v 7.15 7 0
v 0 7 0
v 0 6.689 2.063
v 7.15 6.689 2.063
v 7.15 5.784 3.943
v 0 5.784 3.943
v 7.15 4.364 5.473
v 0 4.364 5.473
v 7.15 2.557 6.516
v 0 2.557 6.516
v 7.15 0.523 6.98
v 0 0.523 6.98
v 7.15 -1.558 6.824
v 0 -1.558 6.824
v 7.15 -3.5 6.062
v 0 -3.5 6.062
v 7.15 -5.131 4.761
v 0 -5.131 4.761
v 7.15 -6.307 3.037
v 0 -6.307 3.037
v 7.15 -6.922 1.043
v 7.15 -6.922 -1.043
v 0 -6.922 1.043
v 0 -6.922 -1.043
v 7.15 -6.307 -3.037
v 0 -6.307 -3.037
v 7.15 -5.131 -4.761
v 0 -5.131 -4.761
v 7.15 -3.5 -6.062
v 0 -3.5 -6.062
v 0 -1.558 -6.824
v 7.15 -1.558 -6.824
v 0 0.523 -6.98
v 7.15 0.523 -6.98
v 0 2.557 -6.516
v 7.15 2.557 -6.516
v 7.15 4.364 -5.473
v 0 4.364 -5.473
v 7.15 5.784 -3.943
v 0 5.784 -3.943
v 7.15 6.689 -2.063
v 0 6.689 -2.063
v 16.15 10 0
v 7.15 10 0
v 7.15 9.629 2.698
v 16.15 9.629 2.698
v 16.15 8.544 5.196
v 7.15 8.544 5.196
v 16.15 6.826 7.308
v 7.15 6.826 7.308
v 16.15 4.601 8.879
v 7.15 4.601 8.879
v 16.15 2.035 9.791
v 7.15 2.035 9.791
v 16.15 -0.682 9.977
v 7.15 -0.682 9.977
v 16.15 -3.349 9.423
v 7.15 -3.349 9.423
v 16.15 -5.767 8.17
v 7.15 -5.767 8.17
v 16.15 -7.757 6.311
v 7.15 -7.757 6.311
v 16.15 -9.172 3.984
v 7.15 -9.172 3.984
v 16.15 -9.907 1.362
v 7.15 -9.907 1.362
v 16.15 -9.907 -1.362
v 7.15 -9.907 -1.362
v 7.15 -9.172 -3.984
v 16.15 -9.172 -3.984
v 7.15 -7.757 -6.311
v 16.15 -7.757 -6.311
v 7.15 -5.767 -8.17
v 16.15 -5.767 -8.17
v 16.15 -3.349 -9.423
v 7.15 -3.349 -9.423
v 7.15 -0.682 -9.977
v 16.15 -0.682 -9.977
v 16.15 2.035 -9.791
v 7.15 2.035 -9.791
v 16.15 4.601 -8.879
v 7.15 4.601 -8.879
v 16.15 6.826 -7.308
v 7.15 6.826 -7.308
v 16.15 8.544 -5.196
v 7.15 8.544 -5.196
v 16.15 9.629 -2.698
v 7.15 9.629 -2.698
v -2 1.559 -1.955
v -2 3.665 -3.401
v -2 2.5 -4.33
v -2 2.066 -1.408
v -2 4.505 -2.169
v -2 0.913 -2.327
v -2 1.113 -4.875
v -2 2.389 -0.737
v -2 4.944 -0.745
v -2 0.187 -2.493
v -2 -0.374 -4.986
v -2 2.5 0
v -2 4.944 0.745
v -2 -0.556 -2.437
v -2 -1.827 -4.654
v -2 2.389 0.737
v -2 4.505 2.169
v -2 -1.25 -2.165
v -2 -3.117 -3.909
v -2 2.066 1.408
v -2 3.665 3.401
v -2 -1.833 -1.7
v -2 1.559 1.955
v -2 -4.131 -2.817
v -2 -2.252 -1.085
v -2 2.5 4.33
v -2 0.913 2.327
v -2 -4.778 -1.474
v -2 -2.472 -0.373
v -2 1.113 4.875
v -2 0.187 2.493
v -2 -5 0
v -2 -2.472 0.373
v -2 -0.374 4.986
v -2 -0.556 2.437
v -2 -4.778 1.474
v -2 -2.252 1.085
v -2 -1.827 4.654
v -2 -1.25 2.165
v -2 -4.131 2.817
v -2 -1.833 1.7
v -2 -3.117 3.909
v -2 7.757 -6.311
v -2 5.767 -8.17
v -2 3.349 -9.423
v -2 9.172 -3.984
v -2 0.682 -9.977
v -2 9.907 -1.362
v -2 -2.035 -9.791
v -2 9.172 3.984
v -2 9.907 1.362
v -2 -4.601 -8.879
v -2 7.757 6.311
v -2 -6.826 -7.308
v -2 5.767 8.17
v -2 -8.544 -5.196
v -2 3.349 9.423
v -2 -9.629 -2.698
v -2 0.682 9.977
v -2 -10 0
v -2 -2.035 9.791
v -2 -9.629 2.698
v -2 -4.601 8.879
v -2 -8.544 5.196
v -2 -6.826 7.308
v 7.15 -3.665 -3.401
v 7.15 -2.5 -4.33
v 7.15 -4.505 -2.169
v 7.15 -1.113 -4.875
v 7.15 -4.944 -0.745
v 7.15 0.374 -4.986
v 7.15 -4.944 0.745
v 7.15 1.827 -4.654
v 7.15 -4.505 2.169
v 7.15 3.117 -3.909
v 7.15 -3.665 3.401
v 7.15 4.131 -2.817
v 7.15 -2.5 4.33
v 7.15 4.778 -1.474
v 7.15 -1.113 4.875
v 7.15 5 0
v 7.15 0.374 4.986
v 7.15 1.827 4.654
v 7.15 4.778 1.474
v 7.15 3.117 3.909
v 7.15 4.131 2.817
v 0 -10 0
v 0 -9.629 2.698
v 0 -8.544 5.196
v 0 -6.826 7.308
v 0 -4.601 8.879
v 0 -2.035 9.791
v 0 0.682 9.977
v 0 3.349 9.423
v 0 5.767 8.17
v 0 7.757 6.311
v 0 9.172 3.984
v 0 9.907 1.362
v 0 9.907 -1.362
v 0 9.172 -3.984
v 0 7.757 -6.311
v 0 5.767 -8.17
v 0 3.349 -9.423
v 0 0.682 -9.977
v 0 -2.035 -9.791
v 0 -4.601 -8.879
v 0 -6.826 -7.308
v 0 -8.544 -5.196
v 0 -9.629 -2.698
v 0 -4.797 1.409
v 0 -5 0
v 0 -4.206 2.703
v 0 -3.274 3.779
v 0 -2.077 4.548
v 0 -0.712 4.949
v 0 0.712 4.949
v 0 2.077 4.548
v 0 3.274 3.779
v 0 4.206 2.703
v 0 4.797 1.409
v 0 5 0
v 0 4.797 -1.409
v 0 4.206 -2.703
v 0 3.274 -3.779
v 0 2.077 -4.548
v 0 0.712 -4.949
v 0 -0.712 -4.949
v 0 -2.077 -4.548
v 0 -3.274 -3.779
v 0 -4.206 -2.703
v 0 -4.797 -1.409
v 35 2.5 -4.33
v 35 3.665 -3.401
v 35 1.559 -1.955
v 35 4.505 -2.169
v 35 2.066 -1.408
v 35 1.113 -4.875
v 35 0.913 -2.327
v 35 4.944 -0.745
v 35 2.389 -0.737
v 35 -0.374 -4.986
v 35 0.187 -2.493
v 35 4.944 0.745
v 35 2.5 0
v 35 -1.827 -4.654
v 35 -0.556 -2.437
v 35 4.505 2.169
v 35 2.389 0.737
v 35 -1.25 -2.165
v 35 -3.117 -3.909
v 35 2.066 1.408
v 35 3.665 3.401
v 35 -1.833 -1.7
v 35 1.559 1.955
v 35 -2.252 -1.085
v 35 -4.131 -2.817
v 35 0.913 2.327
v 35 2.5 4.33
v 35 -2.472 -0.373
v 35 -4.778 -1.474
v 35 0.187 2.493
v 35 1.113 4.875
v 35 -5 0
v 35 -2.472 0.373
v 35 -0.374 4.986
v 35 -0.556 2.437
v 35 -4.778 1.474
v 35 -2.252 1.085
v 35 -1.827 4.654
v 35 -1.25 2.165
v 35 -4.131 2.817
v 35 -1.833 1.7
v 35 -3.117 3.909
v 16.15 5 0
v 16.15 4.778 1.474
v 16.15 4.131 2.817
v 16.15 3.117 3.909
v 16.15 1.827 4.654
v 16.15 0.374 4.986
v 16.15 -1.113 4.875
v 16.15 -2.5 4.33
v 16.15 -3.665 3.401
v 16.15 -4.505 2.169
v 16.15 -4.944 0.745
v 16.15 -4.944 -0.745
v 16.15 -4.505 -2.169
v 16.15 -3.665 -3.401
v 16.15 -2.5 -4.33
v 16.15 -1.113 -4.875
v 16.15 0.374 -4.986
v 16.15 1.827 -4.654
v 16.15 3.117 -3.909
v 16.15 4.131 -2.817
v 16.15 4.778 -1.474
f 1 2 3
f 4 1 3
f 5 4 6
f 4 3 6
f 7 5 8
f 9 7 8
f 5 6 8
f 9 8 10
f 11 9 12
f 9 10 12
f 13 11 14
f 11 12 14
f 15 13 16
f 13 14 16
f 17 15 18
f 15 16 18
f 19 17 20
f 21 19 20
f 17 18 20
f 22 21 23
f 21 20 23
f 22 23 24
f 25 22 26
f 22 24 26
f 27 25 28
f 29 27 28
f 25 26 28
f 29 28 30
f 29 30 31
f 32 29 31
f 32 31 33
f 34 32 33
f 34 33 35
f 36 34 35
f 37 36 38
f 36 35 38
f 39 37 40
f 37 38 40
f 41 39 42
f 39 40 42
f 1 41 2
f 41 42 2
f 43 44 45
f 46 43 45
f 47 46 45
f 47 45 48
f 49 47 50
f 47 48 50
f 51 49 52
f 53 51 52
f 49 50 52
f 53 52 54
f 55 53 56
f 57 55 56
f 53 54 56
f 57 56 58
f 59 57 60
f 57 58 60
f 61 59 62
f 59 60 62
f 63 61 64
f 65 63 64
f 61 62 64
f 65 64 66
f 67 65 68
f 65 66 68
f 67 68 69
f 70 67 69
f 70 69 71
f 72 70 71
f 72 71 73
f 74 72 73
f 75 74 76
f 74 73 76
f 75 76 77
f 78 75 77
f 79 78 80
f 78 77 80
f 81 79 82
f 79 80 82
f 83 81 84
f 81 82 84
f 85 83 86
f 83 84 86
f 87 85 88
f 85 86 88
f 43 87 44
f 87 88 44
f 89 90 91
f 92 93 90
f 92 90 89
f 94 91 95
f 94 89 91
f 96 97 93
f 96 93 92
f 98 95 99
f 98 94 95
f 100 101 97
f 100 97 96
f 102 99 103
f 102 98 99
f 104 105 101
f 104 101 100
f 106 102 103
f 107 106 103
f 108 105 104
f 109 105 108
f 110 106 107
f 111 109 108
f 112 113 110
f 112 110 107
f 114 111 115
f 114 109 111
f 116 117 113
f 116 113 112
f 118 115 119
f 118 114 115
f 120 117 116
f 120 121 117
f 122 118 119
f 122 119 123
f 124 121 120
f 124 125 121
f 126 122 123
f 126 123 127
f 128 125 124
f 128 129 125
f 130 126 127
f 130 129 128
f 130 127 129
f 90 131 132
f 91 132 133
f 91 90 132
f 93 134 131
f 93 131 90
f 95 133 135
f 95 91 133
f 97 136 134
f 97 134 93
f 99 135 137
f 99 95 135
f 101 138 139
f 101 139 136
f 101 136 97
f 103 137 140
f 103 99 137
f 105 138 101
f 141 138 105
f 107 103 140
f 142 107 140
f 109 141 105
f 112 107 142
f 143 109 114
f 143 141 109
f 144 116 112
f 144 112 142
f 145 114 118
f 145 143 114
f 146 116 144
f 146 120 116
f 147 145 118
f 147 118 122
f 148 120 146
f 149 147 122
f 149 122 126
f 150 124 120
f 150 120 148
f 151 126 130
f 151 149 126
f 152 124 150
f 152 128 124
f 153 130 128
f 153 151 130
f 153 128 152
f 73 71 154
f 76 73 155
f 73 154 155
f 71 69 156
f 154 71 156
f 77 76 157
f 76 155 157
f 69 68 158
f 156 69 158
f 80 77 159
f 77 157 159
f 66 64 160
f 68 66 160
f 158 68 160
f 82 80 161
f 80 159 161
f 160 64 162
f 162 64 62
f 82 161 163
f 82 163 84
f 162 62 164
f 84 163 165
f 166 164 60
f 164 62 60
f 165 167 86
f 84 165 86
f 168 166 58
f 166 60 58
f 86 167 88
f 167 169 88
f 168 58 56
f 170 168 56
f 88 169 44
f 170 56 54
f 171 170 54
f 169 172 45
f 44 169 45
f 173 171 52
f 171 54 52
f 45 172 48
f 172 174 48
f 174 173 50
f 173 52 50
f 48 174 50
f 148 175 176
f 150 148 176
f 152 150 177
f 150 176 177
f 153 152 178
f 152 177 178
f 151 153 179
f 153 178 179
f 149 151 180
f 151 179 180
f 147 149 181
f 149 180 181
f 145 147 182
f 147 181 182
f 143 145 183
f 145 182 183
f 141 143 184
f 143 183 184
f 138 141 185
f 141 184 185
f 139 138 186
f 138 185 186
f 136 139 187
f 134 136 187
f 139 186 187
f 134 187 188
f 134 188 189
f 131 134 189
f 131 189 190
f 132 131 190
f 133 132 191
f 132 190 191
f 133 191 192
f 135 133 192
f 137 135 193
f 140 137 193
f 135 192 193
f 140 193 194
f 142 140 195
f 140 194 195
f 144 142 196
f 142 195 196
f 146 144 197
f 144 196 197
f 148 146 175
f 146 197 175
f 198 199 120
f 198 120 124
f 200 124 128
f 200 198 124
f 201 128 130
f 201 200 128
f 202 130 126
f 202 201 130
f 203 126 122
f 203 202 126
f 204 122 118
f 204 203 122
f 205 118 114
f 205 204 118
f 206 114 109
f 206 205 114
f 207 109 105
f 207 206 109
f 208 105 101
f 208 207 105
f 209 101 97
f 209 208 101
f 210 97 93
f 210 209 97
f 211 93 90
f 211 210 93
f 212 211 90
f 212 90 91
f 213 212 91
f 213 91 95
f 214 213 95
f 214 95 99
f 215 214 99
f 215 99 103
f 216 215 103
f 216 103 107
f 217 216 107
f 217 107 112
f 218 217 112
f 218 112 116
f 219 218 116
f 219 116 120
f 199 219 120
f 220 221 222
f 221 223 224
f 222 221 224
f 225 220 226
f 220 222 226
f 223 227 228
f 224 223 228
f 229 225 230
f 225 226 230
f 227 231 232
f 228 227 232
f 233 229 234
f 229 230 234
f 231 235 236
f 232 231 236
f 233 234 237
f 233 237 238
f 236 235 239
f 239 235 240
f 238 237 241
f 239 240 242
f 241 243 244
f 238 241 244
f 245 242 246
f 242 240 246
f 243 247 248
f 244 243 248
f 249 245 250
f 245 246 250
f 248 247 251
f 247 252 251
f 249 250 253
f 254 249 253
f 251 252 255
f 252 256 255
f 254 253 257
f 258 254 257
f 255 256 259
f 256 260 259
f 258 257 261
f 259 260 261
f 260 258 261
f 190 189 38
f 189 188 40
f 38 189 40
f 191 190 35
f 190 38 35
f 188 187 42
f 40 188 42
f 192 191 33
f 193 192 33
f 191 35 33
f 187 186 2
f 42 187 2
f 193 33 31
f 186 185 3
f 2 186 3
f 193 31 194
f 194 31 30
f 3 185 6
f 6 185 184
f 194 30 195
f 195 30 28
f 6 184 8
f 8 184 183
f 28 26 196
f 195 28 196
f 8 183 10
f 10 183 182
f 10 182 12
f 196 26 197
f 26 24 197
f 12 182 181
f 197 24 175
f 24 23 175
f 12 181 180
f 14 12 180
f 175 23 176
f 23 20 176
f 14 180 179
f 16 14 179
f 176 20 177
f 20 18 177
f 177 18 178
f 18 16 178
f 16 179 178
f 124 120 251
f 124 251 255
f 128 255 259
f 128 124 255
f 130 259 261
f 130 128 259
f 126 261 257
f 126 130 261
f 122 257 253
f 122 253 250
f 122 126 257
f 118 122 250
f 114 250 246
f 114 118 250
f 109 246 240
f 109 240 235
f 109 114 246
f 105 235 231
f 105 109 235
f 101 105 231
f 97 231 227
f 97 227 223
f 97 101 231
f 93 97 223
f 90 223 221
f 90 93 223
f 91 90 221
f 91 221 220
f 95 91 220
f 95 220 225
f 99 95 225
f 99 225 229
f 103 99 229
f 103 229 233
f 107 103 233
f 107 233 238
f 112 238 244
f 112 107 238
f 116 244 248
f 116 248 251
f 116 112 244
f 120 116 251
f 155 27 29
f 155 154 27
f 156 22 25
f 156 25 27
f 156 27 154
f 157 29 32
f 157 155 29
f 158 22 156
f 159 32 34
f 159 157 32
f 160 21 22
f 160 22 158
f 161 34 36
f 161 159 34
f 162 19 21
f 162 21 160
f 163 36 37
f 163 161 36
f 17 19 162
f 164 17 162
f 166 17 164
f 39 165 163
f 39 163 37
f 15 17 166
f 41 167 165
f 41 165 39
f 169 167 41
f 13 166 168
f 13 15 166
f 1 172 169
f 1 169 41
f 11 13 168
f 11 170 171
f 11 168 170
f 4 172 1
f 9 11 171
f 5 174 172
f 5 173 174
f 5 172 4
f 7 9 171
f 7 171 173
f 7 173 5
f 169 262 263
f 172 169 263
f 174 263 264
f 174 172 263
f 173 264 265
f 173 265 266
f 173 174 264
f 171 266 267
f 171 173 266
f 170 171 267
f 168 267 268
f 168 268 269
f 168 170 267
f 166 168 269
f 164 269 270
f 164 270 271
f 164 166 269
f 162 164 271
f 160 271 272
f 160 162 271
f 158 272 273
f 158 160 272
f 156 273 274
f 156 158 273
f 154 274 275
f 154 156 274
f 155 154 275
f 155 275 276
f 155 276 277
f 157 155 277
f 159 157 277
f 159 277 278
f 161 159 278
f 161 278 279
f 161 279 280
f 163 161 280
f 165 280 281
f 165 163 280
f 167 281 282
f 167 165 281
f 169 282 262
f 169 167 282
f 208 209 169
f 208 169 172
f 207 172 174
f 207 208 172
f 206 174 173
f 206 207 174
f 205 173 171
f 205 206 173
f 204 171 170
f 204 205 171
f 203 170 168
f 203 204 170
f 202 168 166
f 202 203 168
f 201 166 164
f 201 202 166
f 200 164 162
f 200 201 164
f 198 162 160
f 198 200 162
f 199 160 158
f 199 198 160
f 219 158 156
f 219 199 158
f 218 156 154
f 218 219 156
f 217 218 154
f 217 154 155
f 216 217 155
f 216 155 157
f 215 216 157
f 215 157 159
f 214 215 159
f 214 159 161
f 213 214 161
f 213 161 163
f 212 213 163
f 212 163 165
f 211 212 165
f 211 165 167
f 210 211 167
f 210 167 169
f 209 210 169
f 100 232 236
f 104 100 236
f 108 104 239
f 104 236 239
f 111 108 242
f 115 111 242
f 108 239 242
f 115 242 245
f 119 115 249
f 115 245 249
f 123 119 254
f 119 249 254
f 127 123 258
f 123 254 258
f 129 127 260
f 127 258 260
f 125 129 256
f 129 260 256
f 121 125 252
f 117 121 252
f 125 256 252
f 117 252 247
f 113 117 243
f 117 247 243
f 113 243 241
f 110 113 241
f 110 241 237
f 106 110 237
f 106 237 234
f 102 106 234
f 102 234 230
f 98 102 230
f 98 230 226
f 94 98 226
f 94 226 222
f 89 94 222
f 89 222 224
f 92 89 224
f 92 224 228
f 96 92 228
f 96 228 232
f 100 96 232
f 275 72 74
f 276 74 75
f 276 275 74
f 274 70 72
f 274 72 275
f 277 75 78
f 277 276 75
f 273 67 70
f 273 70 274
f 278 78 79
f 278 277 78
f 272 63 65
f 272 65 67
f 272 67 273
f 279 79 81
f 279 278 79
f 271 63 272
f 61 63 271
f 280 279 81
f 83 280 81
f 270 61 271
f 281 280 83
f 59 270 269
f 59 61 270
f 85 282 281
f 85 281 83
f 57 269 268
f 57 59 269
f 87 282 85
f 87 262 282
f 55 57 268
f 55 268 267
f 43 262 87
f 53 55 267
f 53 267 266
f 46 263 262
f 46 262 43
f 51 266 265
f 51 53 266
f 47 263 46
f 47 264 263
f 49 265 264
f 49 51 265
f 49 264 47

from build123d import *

# Parameters (mm, degrees)
F3_R      = 7
F3_R_2    = 5
F4_DEPTH  = 7.15
F5_R      = 10
F5_R_2    = 5
F6_DEPTH  = 2
F7_R      = 10
F7_R_2    = 5
F8_DEPTH  = 9
F9_R      = 5
F10_DEPTH = 37
F11_D     = 5


with BuildPart() as f4:
    # F3 (on Right) → F4 (new body)
    with BuildSketch(Plane.YZ):
        Circle(F3_R)
        Circle(F3_R_2, mode=Mode.SUBTRACT)
    extrude(amount=F4_DEPTH)

    # F5 (on face) → F6 (join)
    with BuildSketch(Plane(origin=(0, 0, 0), x_dir=(0, -1, 0), z_dir=(-1, 0, 0))):
        Circle(F5_R)
        Circle(F5_R_2, mode=Mode.SUBTRACT)
    extrude(amount=F6_DEPTH)


with BuildPart() as f8:
    # F7 (on face) → F8 (new body)
    with BuildSketch(Plane.YZ.offset(7.15)):
        Circle(F7_R)
        Circle(F7_R_2, mode=Mode.SUBTRACT)
    extrude(amount=F8_DEPTH)


with BuildPart() as f10:
    # F9 (on face) → F10 (new body)
    with BuildSketch(Plane(origin=(-2, 0, 0), x_dir=(0, -1, 0), z_dir=(-1, 0, 0))):
        Circle(F9_R)
    extrude(amount=-F10_DEPTH)

    # F11 (through all)
    with Locations(Plane(origin=(-2, 0, 0), x_dir=(0, -1, 0), z_dir=(-1, 0, 0))):
        with Locations((0, 0)):
            Hole(F11_D / 2)


solid = Compound([f4.part, f8.part, f10.part])
